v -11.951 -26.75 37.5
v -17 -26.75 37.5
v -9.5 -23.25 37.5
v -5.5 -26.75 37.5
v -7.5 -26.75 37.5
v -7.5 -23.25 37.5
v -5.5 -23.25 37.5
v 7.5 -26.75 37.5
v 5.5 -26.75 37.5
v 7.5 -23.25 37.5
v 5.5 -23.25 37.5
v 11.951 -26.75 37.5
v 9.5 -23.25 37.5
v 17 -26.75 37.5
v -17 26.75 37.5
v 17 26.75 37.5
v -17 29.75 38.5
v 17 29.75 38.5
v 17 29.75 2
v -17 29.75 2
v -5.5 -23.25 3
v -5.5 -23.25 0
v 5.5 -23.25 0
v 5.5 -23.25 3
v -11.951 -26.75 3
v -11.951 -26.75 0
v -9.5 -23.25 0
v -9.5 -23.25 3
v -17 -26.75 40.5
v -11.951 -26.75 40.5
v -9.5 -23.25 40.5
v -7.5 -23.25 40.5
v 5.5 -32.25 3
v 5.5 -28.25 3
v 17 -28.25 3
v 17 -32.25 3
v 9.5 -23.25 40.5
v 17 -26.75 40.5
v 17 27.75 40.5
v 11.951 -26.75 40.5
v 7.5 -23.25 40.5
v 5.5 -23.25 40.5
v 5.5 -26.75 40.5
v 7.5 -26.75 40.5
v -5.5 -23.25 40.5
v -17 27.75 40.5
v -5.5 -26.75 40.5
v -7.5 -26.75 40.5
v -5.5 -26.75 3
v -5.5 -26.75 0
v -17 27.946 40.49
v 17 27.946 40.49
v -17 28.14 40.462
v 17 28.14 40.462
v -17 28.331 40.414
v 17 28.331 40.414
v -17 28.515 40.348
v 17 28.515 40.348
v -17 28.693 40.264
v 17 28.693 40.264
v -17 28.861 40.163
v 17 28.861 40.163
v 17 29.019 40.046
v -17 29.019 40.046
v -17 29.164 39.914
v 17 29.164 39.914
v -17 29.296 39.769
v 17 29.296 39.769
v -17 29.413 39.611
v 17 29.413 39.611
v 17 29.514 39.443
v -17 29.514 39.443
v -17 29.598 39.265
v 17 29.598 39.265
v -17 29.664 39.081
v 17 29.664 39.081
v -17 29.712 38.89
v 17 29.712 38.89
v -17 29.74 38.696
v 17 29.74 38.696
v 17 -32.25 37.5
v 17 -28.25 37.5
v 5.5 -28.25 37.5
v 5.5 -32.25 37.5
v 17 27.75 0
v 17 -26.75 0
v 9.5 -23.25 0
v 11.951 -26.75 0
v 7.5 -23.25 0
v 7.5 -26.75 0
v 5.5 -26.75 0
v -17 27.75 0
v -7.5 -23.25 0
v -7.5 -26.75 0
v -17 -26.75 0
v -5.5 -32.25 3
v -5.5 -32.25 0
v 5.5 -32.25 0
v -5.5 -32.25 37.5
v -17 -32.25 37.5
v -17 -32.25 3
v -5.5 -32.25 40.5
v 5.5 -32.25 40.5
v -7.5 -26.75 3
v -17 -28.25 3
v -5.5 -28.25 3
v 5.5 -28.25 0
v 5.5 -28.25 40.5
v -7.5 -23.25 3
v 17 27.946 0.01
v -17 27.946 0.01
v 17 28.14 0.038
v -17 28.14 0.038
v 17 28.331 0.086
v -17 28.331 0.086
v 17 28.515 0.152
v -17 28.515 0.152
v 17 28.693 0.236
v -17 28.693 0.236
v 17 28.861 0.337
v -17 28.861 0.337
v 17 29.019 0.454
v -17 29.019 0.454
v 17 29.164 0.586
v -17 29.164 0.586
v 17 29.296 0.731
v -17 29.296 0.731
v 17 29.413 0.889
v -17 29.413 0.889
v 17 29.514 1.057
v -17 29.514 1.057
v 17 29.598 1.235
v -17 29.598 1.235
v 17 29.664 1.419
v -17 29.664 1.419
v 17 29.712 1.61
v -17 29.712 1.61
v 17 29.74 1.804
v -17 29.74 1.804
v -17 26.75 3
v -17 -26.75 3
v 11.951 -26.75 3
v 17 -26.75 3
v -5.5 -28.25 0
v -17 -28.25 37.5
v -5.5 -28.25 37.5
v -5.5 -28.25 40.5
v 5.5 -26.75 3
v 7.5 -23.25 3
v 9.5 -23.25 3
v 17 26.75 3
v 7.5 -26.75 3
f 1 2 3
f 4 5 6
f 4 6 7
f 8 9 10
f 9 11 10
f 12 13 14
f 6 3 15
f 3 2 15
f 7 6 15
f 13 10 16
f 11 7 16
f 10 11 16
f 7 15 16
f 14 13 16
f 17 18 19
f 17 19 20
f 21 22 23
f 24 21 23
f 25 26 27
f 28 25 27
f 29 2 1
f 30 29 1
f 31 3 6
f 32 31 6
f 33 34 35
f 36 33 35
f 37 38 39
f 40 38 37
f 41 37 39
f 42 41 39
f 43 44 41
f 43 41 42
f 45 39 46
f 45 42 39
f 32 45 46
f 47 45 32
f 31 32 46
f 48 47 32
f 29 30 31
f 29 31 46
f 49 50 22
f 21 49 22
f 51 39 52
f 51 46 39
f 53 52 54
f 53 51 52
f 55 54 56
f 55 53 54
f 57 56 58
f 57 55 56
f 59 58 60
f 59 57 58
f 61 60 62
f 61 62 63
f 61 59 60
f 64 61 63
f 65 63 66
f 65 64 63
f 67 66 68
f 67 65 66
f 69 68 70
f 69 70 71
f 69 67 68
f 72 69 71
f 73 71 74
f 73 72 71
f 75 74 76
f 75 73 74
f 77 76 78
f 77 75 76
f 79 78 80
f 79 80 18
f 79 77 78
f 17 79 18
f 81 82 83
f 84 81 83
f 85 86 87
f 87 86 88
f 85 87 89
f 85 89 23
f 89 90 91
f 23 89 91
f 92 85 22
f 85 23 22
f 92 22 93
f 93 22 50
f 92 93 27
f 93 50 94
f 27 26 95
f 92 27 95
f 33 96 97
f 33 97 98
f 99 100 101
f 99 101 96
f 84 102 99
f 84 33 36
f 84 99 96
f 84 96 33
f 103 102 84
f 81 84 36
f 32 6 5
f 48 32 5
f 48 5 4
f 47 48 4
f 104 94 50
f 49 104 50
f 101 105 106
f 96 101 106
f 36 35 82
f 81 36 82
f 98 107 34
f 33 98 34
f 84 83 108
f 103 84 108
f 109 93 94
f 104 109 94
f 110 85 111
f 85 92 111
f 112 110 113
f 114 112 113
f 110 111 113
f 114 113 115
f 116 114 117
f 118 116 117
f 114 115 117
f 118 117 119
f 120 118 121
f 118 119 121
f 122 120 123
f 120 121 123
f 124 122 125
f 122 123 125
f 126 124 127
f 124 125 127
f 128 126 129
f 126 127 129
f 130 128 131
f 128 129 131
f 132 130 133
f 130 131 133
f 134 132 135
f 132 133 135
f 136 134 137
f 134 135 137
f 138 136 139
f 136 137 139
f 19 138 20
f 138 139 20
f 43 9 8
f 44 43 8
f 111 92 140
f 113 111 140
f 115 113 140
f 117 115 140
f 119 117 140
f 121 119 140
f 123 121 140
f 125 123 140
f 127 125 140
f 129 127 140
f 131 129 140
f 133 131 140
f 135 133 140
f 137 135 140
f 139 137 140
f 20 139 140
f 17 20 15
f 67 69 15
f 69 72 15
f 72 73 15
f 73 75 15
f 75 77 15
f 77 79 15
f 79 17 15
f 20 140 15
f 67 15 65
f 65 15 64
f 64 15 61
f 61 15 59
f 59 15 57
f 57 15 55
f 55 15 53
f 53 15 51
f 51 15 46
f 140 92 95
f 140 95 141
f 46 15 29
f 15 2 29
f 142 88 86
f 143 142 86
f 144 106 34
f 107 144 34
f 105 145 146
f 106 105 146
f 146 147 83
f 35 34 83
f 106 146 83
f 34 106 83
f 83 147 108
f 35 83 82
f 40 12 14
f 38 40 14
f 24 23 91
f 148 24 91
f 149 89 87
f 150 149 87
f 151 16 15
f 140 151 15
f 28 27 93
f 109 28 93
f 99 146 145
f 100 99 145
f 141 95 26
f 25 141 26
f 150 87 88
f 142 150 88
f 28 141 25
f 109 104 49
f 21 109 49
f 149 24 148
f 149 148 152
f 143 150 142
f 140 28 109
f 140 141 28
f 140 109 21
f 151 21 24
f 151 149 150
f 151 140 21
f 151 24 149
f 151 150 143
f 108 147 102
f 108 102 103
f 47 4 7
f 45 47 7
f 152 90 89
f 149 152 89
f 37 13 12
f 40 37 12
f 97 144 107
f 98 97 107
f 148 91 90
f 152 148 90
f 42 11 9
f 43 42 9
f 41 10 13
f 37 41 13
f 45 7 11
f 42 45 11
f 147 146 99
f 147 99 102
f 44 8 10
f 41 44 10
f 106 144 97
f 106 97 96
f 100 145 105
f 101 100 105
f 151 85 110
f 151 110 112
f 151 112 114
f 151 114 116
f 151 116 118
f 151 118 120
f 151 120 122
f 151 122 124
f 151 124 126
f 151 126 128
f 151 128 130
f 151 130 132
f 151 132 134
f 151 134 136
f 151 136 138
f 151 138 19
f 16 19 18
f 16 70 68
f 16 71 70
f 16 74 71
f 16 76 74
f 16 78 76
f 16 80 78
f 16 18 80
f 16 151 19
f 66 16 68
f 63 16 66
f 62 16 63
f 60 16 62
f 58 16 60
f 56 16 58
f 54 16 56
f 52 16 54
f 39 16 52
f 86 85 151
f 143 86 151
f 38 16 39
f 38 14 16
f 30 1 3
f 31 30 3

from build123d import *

# Parameters (mm, degrees)
F5_DEPTH  = 3
F7_W      = 34
F7_H      = 40.5
F8_DEPTH  = 3
F9_R      = 2
F11_W     = 11
F11_H     = 3
F12_DEPTH = 4


with BuildPart() as f5:
    # F2 (on Top) → F5 (new body)
    with BuildSketch(Plane.XY):
        Polygon((-17, 26.75), (-17, -26.75), (-11.9507263837, -26.75), (-9.5, -23.25), (-7.5, -23.25), (-7.5, -26.75), (-5.5, -26.75), (-5.5, -23.25), (5.5, -23.25), (5.5, -26.75), (7.5, -26.75), (7.5, -23.25), (9.5, -23.25), (11.9507263837, -26.75), (17, -26.75), (17, 26.75), align=None)
    extrude(amount=F5_DEPTH)



with BuildPart() as f5b:
    # F4 (on offset) → F5, piece 2 (new body)
    with BuildSketch(Plane.XY.offset(37.5)):
        Polygon((5.5, -26.75), (7.5, -26.75), (7.5, -23.25), (9.5, -23.25), (11.9507263837, -26.75), (17, -26.75), (17, 26.75), (-17, 26.75), (-17, -26.75), (-11.9507263837, -26.75), (-9.5, -23.25), (-7.5, -23.25), (-7.5, -26.75), (-5.5, -26.75), (-5.5, -23.25), (5.5, -23.25), align=None)
    extrude(amount=F5_DEPTH)


with BuildPart() as f5_1:
    add(f5.part)

    add(f5b.part)  # F8 merges F5b
    # F7 (on offset) → F8 (join)
    with BuildSketch(Plane(origin=(0, 26.75, 0), x_dir=(-1, 0, 0), z_dir=(0, 1, 0))):
        with Locations((0, 20.25)):
            Rectangle(F7_W, F7_H)
    extrude(amount=F8_DEPTH)

    # F9
    f9_edges = [f5_1.edges().sort_by_distance(p)[0] for p in [
        (0, 29.75, 40.5),
        (0, 29.75, 0),
    ]]
    fillet(f9_edges, radius=F9_R)


with BuildPart() as f12:
    # F11 (on offset) → F12 (new body)
    with BuildSketch(Plane.XZ.offset(28.25)):
        with Locations((0, 39)):
            Rectangle(F11_W, F11_H)
        Polygon((5.5, 37.5), (-5.5, 37.5), (-17, 37.5), (-17, 3), (-5.5, 3), (5.5, 3), (17, 3), (17, 37.5), align=None)
        with Locations((0, 1.5)):
            Rectangle(F11_W, F11_H)
    extrude(amount=F12_DEPTH)


solid = Compound([f5_1.part, f12.part])
